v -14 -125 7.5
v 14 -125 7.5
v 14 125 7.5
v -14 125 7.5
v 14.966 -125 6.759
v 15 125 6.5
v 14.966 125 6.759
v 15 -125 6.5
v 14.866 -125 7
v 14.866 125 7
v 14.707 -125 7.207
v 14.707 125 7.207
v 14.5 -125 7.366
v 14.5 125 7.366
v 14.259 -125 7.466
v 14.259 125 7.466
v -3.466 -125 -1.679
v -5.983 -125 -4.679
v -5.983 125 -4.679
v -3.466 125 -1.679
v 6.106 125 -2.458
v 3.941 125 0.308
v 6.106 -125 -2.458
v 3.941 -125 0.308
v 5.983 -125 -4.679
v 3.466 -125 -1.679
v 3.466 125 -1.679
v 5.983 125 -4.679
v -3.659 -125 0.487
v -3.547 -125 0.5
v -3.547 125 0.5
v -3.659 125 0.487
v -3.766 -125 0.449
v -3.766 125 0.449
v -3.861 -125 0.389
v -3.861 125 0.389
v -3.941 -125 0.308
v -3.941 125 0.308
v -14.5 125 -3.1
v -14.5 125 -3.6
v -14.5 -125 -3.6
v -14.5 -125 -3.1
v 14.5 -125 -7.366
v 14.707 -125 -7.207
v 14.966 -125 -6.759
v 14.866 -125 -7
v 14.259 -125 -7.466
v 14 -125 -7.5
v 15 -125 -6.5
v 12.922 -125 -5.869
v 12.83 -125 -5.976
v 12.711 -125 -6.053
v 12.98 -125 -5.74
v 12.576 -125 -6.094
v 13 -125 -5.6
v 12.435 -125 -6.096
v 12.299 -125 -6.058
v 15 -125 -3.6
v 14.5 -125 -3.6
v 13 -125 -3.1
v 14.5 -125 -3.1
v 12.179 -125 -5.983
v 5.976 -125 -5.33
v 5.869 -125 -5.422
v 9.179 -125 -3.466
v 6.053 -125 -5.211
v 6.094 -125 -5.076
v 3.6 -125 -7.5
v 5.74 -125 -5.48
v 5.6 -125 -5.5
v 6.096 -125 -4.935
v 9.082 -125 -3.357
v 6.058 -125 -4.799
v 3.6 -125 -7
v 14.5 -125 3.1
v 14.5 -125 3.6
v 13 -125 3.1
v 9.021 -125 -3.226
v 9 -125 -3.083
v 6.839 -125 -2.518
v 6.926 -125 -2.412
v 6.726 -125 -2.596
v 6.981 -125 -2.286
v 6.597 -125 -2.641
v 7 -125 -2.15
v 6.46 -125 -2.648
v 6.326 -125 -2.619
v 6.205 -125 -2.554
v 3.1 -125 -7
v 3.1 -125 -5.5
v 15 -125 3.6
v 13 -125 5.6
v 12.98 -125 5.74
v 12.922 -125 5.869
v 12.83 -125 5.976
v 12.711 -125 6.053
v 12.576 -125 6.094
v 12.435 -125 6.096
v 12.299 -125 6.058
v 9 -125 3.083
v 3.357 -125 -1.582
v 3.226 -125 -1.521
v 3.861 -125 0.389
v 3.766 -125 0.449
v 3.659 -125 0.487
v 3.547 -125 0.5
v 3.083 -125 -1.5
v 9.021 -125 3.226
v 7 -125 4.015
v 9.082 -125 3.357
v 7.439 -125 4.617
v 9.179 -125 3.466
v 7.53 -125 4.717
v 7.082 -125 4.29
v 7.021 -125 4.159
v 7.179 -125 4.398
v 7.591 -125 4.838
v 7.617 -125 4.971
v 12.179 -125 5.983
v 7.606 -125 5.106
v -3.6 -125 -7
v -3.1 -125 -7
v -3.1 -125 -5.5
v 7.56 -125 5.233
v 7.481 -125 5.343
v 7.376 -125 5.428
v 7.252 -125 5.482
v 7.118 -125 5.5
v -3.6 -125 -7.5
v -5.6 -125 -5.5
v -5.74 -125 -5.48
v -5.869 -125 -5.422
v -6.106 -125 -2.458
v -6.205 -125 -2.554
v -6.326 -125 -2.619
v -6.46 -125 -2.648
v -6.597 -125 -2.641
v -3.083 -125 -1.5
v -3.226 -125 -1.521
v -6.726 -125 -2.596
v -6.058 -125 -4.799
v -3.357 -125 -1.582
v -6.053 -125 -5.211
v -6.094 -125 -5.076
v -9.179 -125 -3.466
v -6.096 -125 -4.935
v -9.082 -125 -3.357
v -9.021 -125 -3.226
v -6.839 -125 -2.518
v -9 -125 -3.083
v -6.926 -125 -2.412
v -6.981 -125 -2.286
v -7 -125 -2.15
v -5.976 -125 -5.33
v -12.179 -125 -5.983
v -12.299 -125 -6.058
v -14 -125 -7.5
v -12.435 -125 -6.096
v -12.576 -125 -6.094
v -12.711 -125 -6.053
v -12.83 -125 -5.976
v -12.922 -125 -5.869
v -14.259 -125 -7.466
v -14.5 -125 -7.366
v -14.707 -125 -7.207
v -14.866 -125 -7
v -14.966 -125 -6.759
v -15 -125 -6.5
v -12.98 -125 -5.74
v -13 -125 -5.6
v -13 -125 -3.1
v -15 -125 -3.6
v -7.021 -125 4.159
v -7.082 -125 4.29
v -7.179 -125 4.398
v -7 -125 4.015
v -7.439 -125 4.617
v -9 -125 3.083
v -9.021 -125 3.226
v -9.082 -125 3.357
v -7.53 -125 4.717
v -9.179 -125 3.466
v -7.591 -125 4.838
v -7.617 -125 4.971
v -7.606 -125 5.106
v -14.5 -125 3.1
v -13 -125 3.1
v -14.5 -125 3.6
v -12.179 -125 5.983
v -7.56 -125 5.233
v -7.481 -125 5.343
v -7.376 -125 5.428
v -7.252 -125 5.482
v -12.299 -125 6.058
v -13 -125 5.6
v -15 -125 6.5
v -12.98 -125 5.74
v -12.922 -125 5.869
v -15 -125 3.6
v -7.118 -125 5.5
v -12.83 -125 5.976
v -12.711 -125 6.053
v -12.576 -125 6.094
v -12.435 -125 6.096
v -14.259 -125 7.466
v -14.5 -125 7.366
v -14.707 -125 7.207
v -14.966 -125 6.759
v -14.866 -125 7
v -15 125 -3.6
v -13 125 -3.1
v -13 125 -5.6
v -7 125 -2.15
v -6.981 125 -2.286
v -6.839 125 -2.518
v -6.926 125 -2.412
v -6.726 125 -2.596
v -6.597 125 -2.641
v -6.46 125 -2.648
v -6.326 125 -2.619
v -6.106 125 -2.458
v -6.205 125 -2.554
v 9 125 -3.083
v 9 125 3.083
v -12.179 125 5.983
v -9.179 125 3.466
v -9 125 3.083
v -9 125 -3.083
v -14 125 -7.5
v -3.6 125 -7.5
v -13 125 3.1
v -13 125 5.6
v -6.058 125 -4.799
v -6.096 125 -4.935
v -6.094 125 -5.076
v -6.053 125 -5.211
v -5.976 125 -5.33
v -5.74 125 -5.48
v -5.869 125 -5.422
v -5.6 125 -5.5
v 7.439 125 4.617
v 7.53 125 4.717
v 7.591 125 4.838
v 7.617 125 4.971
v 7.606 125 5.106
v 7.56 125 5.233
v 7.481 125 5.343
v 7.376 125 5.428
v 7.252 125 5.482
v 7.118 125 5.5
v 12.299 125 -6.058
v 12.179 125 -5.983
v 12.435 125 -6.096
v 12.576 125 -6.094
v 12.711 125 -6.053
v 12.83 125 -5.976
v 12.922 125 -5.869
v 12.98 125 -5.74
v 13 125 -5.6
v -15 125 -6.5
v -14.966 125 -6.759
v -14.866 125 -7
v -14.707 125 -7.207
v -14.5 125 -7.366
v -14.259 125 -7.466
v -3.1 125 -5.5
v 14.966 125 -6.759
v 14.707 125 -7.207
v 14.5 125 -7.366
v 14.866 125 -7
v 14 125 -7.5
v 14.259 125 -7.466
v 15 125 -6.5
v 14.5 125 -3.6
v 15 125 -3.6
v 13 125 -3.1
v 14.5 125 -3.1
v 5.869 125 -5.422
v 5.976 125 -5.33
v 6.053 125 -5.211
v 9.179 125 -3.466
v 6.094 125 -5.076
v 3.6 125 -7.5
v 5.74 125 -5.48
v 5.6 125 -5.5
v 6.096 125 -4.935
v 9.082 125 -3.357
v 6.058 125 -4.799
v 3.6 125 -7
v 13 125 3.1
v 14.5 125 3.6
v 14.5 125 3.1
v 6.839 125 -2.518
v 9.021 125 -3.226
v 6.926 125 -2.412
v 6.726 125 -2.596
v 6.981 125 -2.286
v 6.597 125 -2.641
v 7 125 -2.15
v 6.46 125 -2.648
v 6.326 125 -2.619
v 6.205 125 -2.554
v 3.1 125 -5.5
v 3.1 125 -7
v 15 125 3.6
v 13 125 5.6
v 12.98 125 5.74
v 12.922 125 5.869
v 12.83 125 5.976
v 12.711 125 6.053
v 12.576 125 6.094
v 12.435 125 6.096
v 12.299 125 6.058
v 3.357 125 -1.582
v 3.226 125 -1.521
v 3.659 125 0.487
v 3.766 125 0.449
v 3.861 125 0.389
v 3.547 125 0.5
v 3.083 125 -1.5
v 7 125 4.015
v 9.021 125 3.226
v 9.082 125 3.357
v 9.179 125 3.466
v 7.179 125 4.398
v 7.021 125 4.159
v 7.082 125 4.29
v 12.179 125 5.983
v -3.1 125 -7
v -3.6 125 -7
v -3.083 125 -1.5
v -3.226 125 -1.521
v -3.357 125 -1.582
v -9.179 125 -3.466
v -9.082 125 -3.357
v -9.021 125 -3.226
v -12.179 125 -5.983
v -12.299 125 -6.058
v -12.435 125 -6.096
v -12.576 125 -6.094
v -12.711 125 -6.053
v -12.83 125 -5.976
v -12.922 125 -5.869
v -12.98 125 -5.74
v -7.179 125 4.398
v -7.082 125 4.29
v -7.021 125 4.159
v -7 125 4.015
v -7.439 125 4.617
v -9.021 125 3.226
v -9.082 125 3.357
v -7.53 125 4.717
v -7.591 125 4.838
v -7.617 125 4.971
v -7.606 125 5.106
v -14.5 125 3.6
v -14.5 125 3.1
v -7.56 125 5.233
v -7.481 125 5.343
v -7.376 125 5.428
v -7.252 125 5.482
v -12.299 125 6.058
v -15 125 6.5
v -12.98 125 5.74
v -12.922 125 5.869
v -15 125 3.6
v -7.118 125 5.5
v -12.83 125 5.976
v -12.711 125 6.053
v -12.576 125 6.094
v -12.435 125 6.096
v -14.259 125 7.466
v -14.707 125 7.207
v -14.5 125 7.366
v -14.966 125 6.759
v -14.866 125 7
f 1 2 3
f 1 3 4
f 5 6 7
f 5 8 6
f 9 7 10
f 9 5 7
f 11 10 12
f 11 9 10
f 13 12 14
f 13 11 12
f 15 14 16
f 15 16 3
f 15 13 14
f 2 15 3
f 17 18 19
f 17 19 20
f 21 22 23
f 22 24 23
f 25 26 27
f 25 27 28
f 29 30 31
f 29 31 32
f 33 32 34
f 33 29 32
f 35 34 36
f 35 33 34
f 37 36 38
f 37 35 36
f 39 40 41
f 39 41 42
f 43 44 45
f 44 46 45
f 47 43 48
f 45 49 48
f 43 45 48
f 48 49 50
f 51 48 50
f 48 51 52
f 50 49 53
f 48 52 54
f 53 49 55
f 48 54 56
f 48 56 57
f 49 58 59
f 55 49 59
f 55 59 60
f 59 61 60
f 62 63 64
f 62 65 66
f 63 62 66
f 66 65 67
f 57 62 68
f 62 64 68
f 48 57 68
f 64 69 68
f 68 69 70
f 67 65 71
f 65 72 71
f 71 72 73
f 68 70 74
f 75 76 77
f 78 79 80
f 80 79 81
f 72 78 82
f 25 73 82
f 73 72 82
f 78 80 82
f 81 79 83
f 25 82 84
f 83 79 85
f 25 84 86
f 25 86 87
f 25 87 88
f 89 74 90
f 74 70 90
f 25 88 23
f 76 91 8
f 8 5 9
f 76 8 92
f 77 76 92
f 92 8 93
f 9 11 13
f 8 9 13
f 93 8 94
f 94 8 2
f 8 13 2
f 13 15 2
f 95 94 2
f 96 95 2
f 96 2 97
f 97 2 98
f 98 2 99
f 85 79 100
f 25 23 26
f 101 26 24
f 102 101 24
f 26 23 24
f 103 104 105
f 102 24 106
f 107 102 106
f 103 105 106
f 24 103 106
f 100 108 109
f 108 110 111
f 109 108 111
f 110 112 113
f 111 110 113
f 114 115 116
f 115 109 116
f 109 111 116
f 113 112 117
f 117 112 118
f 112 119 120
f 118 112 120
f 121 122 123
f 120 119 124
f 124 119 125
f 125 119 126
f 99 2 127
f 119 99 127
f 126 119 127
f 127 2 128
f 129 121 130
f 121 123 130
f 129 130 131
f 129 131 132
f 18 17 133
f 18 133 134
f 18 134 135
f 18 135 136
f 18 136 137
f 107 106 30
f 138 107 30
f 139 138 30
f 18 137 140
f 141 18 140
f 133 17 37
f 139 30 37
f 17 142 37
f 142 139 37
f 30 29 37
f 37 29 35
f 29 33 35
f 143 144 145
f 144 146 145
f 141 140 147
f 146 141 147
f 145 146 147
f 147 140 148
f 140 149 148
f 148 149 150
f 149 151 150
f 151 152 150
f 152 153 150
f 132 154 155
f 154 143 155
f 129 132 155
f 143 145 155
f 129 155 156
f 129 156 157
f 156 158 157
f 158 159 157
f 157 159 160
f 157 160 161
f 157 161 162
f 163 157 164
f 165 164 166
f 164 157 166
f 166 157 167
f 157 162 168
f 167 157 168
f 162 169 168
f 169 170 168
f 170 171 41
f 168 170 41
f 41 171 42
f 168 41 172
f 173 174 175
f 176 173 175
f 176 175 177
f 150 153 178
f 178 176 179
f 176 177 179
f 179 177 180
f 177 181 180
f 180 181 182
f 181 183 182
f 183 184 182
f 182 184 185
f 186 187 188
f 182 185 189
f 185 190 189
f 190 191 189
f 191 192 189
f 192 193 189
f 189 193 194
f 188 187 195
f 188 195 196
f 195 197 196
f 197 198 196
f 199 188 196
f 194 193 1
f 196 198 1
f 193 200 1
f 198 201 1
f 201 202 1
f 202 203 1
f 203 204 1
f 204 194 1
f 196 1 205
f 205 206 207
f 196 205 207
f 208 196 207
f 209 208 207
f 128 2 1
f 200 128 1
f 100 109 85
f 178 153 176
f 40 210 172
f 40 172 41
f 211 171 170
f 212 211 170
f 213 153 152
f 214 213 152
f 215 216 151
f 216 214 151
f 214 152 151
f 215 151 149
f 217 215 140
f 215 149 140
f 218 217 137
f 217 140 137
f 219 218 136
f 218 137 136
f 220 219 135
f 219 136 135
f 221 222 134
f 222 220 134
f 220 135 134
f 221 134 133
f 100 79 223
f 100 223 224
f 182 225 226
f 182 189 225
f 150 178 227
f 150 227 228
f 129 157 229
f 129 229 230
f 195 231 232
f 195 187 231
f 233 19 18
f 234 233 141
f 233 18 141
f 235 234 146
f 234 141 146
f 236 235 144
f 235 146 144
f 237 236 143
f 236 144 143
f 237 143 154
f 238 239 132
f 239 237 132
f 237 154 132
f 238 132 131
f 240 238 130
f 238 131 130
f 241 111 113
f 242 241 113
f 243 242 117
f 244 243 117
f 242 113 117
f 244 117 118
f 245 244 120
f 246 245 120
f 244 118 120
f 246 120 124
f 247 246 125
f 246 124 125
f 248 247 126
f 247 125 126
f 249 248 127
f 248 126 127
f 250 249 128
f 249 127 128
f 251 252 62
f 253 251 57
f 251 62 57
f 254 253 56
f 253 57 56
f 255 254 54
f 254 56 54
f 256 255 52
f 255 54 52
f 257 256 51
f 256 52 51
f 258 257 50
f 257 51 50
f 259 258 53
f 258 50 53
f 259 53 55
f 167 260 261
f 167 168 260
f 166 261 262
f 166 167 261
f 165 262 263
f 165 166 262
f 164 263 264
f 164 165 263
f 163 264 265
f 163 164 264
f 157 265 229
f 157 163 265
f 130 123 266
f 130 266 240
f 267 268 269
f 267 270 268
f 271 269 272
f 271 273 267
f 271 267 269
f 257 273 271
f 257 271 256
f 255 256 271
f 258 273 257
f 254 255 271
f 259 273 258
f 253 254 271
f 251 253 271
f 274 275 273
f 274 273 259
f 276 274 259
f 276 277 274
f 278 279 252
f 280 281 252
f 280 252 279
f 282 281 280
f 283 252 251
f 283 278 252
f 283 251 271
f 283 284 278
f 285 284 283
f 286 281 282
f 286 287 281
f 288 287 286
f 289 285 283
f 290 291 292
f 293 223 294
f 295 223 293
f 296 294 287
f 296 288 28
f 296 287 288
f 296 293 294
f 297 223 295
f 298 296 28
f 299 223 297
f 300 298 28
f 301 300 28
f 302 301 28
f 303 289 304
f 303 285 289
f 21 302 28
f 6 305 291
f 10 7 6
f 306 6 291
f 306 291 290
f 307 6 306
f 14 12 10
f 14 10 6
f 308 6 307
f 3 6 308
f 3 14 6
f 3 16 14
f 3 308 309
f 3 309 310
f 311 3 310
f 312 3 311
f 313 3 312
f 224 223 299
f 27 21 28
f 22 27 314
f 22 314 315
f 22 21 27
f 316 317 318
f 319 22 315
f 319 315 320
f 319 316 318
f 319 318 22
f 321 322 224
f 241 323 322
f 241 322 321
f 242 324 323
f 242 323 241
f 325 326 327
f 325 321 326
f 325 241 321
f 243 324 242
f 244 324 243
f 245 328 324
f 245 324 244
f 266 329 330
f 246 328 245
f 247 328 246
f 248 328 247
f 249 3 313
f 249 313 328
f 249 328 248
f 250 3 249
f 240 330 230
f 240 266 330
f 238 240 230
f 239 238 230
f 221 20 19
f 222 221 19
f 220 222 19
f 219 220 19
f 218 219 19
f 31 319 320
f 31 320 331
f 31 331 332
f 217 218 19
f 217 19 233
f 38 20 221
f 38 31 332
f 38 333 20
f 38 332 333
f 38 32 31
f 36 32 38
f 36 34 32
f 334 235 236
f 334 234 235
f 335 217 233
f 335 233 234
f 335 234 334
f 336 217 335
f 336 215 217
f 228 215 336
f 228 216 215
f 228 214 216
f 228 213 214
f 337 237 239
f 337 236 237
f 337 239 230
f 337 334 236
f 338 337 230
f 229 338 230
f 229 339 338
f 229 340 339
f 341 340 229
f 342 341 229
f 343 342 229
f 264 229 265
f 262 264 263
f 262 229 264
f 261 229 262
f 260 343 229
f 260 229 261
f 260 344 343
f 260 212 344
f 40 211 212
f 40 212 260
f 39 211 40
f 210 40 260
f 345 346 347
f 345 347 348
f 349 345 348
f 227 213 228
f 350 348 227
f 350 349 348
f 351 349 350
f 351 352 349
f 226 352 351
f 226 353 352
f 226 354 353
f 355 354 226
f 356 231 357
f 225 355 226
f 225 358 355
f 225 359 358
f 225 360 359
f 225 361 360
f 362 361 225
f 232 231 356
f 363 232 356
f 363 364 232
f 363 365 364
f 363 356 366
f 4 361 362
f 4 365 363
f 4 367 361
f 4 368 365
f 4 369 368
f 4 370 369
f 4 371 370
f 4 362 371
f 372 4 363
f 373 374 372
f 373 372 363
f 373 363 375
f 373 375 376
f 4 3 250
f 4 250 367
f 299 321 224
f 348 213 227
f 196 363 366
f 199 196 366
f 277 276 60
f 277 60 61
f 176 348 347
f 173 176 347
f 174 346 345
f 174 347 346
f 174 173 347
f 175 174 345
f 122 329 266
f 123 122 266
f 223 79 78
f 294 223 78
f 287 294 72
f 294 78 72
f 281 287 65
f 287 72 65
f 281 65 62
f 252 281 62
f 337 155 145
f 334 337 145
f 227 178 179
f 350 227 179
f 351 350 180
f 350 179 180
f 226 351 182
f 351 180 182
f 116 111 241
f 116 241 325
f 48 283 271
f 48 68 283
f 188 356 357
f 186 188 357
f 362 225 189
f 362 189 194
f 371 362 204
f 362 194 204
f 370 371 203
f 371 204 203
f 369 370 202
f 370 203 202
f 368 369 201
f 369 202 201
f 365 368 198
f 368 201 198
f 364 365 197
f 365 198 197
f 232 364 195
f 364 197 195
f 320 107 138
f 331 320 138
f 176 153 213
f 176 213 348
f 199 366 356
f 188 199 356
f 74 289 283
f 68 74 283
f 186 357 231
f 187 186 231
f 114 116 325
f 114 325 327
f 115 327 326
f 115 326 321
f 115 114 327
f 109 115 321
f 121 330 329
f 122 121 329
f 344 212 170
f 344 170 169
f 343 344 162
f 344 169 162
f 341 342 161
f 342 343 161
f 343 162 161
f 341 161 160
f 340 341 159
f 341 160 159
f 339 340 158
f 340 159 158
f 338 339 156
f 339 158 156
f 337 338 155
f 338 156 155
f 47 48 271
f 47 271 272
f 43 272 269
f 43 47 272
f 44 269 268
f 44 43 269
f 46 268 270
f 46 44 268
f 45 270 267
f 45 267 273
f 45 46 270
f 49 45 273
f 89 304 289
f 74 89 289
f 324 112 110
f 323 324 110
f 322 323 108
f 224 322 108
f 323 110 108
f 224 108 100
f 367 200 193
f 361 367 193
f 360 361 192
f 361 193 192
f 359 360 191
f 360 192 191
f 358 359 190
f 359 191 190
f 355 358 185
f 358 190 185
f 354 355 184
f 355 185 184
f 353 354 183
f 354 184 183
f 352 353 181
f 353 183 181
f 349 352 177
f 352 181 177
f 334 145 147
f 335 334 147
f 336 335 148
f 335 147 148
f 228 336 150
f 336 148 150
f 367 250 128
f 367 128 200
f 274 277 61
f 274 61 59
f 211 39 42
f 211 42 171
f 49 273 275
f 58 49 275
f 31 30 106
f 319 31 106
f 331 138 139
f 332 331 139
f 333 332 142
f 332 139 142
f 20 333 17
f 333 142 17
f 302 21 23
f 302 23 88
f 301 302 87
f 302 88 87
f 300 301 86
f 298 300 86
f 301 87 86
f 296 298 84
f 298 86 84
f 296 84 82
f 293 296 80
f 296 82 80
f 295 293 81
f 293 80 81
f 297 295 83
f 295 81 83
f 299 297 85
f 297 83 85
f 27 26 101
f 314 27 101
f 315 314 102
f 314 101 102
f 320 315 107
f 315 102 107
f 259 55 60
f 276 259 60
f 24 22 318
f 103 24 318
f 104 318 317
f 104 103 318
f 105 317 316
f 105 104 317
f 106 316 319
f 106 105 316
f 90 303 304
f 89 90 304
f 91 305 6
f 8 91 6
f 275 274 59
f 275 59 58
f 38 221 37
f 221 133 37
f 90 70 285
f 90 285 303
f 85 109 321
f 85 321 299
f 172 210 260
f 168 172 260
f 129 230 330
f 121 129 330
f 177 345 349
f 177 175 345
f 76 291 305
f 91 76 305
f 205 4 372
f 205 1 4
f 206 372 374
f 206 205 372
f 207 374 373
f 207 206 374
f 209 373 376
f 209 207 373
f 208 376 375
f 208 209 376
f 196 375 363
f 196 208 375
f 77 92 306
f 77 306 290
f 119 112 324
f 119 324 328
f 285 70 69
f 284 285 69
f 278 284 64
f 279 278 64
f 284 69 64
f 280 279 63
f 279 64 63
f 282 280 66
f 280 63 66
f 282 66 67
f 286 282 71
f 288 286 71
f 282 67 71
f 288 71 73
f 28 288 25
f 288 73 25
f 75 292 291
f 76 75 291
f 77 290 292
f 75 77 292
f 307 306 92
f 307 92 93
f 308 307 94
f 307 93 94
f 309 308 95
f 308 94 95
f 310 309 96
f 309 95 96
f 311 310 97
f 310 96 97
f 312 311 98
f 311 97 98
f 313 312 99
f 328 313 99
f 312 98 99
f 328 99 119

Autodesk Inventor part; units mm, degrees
ref_plane "YZ Plane" through (0, 0, 0) normal (1, 0, 0) x (0, 1, 0)
ref_plane "XZ Plane" through (0, 0, 0) normal (0, 1, 0) x (-1, 0, 0)
ref_plane "XY Plane" through (0, 0, 0) normal (0, 0, 1) x (1, 0, 0)
sketch "Esboço1" plane through (0, 0, 0) normal (0, 1, 0) x (-1, 0, 0)
  line L0 (-15, 7.5) -> (15, 7.5) construction
  line L1 (15, 7.5) -> (15, -7.5) construction
  line L2 (15, -7.5) -> (-15, -7.5) construction
  line L3 (-15, -7.5) -> (-15, 7.5) construction
  line L4 (15, 7.5) -> (-15, -7.5) construction
  line L5 (0, 7.5) -> (14, 7.5)
  arc A0 (15, 6.5) -> (14, 7.5) centre (14, 6.5) ccw
  line L6 (15, 6.5) -> (15, 3.6)
  line L7 (15, 3.6) -> (14.5, 3.6)
  line L8 (14.5, 3.6) -> (14.5, 3.1)
  line L9 (14.5, 3.1) -> (13, 3.1)
  line L10 (13, 3.1) -> (13, 5.6)
  line L11 (12.1786, 5.983) -> (9.1786, 3.4657)
  arc A1 (13, 5.6) -> (12.1786, 5.983) centre (12.5, 5.6) ccw
  arc A2 (9.1786, 3.4657) -> (9, 3.0827) centre (9.5, 3.0827) ccw
  line L12 (14, -7.5) -> (3.6, -7.5)
  line L13 (15, -3.6) -> (15, -6.5)
  arc A3 (14, -7.5) -> (15, -6.5) centre (14, -6.5) ccw
  line L14 (15, -3.6) -> (14.5, -3.6)
  line L15 (14.5, -3.6) -> (14.5, -3.1)
  line L16 (14.5, -3.1) -> (13, -3.1)
  line L17 (13, -3.1) -> (13, -5.6)
  line L18 (12.1786, -5.983) -> (9.1786, -3.4657)
  arc A4 (12.1786, -5.983) -> (13, -5.6) centre (12.5, -5.6) ccw
  line L19 (9, 3.0827) -> (9, -3.0827)
  arc A5 (9, -3.0827) -> (9.1786, -3.4657) centre (9.5, -3.0827) ccw
  line L20 (0, 5.5) -> (7.1178, 5.5)
  line L21 (0, 5.5) -> (0, 7.5)
  line L22 (13, -3.1) -> (13, 3.1) construction
  line L23 (7, -2.1501) -> (7, 4.0153)
  arc A6 (7.4392, 4.617) -> (7.1178, 5.5) centre (7.1178, 5) ccw
  arc A7 (7.1786, 4.3983) -> (7, 4.0153) centre (7.5, 4.0153) ccw
  line L24 (8.4915, 5.5) -> (7.1178, 5.5) construction
  line L25 (8.4915, 5.5) -> (7.1786, 4.3983) construction
  line L26 (7.1786, 4.3983) -> (7.4392, 4.617)
  line L27 (7, 4.0153) -> (7, -3.6) construction
  line L28 (7, -3.6) -> (3.9407, 0.3082) construction
  arc A8 (6.1063, -2.4583) -> (7, -2.1501) centre (6.5, -2.1501) ccw
  line L29 (6.1063, -2.4583) -> (3.9407, 0.3082)
  line L30 (3.547, 0.5) -> (0, 0.5)
  arc A9 (3.9407, 0.3082) -> (3.547, 0.5) centre (3.547, 0) ccw
  line L31 (0, 0.5) -> (0, -1.5)
  line L32 (0, -1.5) -> (3.0827, -1.5)
  line L33 (3.6, -7.5) -> (3.6, -7)
  line L34 (3.6, -7) -> (3.1, -7)
  line L35 (3.1, -7) -> (3.1, -5.5)
  line L36 (3.1, -5.5) -> (5.6, -5.5)
  line L37 (5.983, -4.6786) -> (3.4657, -1.6786)
  arc A10 (3.4657, -1.6786) -> (3.0827, -1.5) centre (3.0827, -2) ccw
  arc A11 (5.6, -5.5) -> (5.983, -4.6786) centre (5.6, -5) ccw
  line L38 (0, 2.5907) -> (0, -7.5) construction
  point P0 (0, 0)
  point P1 (13, -4.35)
  point P2 (13, 0)
  point P3 (9.0468, 3.294)
  dimension "d14" = 30
  dimension "d15" = 15
  dimension "d22" = 2
  dimension "d23" = 0.5
  dimension "d34" = 2.5
  dimension "d35" = 1
  dimension "d37" = 0.5
  dimension "d38" = 50
  dimension "d41" = 6
  dimension "d45" = 2
  dimension "d46" = 6.2
  dimension "d47" = 2
  dimension "d50" = 0.5
  dimension "d53" = 2
  dimension "d55" = 2
  dimension "d56" = 3.1
  dimension "d59" = 6
  dimension "d60" = 50
  dimension "d62" = 2
  dimension "d64" = 1.4656
extrude "Extrusão1" add sketch "Esboço1" along normal mid plane 250
mirror "Espelhar1" about plane through (0, 0, 0) normal (1, 0, 0) of "Extrusão1"
equation "\"d47\" = d45"
equation "\"Raio_vergadura\" = Espessura"
equation "\"Largura_alívio_de_vergadura\" = Espessura"
equation "\"Profundidade_alívio_de_vergadura\" = 0.5 * Espessura"
equation "\"Tamanho_alívio_de_dobra\" = 4 * Espessura"
equation "\"Remanescente_mínimo\" = 2 * Espessura"
equation "\"Raiodetransição\" = Raio_vergadura"
equation "\"Tamanho_de_raio_de_Jacobi\" = Raio_vergadura"
equation "\"TamanhoFolga\" = Espessura"
equation "\"Espessura\" = 0.5"
